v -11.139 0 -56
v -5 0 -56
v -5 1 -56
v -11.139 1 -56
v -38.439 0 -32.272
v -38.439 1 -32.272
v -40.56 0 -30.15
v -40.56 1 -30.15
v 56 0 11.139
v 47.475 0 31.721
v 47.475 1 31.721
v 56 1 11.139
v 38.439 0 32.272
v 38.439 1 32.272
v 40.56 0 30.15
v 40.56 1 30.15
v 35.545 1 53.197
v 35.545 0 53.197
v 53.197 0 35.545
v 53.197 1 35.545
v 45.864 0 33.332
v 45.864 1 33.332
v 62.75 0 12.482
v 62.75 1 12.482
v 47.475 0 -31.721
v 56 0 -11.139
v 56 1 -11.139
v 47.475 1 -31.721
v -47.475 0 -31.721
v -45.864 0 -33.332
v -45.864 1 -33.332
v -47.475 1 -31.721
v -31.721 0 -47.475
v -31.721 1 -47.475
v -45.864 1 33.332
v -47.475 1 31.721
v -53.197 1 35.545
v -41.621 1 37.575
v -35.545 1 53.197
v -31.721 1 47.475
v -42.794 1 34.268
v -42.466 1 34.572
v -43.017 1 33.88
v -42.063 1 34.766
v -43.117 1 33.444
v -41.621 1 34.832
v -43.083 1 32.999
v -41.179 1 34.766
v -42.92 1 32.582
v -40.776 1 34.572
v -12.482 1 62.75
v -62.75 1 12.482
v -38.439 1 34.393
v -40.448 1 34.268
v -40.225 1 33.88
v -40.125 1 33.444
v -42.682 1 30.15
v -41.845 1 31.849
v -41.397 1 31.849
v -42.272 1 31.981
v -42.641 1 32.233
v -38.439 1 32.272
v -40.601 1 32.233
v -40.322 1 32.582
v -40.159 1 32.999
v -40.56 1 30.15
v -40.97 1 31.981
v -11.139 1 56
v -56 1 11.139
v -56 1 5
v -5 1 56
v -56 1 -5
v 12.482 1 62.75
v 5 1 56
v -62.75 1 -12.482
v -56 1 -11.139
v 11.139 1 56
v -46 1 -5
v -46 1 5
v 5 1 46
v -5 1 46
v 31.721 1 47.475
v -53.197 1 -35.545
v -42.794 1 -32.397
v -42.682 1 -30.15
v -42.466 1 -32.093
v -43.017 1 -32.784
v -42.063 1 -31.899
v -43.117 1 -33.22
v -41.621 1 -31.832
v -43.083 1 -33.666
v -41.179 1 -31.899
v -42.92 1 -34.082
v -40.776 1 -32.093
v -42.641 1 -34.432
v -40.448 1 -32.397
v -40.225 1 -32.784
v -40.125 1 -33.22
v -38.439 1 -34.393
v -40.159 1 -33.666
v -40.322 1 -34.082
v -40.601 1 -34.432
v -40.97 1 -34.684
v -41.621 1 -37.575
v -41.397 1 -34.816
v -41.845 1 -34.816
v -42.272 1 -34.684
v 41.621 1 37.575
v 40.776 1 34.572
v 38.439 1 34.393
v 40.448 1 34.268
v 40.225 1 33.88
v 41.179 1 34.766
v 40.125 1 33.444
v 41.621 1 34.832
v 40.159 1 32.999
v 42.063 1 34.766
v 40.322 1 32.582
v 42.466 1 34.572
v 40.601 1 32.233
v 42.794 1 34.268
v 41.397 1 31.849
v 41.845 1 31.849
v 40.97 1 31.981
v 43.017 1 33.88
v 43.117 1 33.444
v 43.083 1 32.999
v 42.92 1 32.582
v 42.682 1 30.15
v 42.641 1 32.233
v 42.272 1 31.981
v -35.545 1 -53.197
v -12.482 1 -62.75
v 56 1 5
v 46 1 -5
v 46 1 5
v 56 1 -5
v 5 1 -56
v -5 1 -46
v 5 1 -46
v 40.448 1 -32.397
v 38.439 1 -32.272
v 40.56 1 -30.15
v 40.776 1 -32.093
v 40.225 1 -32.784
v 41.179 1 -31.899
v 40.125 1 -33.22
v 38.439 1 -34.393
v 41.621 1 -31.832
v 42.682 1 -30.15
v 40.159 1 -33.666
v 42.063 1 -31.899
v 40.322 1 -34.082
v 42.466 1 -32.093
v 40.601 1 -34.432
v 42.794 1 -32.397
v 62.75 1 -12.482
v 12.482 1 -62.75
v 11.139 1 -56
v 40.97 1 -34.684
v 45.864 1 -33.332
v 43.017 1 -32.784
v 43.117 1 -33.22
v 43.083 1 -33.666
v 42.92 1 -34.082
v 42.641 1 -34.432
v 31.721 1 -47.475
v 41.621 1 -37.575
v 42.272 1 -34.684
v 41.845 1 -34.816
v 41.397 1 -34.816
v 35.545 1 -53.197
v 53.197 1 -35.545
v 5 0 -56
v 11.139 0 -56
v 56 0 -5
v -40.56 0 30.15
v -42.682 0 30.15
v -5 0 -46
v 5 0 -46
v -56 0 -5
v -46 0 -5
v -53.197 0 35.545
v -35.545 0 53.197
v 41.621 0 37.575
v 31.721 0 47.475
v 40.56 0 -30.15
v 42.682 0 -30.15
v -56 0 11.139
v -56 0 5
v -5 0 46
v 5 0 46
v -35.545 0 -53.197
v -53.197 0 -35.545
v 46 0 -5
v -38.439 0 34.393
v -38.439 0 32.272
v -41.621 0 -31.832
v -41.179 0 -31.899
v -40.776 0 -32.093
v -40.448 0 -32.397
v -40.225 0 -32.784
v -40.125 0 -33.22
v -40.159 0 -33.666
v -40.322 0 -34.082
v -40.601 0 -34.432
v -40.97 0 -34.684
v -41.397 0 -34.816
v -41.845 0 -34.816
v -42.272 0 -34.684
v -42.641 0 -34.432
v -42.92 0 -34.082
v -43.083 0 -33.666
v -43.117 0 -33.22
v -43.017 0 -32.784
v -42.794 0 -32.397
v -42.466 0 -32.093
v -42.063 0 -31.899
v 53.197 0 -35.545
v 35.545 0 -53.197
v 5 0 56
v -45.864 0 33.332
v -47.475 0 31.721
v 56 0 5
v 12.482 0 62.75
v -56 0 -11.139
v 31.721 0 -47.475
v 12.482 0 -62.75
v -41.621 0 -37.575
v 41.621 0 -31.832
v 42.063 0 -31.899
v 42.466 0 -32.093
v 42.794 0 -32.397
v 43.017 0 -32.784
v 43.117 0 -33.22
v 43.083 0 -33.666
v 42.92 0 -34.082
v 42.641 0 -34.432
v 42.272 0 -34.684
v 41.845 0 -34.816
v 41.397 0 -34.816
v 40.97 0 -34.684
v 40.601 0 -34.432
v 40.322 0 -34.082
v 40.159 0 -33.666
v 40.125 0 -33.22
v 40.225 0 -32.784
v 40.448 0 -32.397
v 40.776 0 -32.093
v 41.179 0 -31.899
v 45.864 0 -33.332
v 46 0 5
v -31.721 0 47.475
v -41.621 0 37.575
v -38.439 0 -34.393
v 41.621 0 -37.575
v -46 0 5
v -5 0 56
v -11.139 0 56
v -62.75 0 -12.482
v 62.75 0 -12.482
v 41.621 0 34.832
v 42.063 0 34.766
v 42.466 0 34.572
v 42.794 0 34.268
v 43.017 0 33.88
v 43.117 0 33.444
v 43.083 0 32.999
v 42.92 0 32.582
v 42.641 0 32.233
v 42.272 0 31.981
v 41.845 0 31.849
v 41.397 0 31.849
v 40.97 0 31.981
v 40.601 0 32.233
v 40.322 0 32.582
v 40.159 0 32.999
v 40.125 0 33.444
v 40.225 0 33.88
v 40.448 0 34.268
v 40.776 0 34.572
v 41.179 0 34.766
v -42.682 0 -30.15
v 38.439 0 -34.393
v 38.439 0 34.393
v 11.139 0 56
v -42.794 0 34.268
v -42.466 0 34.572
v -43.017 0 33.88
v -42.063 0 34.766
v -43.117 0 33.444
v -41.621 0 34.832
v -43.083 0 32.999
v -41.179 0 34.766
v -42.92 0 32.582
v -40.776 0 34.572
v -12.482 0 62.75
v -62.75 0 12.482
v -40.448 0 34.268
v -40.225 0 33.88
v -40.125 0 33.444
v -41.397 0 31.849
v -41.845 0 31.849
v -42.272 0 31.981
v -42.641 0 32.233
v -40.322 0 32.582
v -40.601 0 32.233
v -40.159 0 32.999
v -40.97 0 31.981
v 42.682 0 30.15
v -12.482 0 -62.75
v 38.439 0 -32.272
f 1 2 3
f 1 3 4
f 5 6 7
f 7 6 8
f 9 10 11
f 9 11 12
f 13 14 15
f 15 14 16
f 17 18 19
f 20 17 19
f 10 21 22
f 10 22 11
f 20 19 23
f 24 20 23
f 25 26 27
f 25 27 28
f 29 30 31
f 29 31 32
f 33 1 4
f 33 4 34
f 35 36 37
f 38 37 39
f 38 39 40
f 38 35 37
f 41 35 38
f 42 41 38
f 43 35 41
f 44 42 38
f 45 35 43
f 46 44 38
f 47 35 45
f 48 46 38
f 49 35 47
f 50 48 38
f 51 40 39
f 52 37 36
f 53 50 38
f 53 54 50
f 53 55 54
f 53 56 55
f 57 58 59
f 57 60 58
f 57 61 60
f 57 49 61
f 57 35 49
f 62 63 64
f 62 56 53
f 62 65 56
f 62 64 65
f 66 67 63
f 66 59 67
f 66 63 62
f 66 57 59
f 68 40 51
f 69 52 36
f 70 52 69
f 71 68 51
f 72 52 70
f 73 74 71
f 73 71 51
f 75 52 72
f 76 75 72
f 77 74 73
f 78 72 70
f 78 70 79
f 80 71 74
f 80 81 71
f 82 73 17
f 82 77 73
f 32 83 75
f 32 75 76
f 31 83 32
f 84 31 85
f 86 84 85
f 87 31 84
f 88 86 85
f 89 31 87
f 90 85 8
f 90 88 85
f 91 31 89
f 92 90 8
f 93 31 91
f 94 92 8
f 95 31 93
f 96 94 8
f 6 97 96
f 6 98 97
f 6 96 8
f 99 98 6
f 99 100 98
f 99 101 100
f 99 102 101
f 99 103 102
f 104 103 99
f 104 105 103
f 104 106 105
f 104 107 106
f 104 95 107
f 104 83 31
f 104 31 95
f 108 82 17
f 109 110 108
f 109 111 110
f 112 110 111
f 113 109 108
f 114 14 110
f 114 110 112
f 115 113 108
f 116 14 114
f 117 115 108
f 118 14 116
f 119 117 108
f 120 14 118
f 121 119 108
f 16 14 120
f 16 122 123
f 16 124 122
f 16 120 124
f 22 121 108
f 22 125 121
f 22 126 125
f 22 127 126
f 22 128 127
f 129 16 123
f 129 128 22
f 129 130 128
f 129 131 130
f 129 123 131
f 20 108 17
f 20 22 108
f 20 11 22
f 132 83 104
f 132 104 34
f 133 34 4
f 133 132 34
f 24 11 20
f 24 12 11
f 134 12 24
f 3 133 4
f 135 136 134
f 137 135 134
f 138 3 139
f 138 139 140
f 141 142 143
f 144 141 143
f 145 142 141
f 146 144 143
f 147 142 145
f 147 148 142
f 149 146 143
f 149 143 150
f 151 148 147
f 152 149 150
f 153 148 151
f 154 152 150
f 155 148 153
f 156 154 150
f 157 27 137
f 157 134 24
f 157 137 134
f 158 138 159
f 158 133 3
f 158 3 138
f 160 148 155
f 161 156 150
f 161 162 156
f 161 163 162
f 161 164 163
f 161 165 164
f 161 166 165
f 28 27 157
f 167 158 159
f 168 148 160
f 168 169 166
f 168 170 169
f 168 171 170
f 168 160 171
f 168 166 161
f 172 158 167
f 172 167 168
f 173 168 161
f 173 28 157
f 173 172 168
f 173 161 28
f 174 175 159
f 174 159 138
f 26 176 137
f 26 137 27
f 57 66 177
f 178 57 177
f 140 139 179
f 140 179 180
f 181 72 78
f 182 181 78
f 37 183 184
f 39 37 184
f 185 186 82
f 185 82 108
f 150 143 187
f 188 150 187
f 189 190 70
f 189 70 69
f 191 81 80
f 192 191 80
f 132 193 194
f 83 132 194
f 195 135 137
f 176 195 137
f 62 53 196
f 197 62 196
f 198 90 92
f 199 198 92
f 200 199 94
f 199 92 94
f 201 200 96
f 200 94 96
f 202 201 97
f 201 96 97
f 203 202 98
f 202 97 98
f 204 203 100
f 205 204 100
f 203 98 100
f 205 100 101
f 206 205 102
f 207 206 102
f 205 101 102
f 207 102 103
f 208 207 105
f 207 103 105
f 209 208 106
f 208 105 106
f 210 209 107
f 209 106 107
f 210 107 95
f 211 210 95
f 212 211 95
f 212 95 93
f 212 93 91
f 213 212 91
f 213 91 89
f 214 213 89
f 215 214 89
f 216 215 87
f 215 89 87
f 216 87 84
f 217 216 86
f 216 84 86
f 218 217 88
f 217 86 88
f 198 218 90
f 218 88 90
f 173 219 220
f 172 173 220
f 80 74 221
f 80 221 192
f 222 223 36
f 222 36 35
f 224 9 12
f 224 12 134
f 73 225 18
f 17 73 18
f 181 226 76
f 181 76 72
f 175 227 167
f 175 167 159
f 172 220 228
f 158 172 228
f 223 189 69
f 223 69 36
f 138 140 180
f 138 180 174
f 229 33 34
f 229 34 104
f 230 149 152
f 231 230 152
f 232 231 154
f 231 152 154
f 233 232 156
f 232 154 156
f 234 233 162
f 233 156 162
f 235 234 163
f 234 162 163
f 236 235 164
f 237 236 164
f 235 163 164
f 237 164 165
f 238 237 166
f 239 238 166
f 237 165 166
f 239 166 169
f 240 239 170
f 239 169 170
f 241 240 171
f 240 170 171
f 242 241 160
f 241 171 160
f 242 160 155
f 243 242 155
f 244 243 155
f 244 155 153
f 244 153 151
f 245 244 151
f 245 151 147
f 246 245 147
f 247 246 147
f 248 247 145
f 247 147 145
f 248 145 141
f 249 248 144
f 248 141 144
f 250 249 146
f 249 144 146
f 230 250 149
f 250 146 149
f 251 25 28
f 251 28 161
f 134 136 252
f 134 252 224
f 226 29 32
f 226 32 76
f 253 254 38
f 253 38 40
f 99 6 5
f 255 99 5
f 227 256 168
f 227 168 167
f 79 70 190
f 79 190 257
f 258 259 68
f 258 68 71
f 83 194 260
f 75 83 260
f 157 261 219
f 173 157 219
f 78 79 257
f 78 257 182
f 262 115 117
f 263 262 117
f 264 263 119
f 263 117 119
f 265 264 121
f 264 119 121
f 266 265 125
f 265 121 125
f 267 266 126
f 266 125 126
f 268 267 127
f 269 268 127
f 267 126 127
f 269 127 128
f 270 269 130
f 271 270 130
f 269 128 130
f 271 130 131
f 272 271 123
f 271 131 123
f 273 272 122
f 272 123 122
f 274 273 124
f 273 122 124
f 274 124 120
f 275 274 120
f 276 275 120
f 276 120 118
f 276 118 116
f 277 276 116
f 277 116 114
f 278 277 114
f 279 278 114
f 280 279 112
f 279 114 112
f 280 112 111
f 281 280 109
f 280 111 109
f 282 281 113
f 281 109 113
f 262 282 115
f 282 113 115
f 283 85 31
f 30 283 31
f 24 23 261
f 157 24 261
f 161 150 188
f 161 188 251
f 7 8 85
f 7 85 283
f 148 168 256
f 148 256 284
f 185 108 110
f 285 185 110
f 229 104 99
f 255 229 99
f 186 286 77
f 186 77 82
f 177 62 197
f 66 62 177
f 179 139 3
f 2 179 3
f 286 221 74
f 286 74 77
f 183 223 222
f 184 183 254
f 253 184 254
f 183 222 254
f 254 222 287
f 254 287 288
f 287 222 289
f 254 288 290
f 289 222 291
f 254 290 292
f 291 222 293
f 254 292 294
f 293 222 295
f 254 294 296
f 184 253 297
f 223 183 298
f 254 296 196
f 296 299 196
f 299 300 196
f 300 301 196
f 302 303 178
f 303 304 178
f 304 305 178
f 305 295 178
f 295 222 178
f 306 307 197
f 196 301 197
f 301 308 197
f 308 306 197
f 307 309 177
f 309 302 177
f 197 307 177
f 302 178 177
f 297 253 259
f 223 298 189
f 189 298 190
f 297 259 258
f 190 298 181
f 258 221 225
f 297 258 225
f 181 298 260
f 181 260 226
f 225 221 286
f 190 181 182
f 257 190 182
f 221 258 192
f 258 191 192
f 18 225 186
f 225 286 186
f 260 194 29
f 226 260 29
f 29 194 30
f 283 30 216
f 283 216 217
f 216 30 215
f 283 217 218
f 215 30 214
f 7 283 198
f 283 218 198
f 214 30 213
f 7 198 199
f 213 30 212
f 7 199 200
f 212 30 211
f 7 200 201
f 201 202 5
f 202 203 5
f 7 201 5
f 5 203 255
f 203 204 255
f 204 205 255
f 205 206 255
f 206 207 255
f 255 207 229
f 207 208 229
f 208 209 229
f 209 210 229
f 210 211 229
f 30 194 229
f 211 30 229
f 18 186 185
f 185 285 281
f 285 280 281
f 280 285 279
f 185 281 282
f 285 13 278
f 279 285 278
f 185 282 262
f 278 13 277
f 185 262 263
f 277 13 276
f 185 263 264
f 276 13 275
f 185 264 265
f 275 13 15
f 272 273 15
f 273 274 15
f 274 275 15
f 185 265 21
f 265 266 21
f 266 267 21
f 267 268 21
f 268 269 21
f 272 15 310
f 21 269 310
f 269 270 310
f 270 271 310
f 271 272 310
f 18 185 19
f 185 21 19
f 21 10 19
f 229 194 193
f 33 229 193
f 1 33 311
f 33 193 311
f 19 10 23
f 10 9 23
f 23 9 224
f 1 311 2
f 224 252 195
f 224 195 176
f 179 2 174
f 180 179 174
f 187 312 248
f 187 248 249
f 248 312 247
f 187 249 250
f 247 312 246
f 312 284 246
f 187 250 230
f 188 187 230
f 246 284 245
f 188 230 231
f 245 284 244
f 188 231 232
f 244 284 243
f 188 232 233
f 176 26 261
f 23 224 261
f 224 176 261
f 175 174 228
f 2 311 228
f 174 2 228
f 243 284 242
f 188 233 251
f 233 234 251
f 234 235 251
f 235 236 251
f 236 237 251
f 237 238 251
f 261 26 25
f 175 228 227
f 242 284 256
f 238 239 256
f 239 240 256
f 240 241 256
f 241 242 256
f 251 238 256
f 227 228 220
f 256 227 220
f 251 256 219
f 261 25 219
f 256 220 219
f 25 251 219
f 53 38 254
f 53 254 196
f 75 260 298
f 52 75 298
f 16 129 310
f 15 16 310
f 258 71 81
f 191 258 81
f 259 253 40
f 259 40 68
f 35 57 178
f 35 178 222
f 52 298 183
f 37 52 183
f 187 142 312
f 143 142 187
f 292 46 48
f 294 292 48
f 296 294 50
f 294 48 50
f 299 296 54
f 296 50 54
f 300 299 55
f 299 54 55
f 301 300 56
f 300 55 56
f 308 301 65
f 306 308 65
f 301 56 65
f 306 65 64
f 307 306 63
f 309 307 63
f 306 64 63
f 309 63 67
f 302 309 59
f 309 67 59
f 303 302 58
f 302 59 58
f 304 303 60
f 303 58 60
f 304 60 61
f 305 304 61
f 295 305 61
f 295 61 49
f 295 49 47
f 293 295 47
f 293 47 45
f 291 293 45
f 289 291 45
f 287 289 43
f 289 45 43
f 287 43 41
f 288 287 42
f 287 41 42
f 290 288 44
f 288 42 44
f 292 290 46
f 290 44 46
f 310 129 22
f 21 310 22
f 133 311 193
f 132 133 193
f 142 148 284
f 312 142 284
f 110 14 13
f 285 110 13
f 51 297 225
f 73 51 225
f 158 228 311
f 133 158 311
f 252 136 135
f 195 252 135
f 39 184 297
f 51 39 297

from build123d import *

# Parameters (mm, degrees)
BOSS_EXTRUDE1_DEPTH = 1
SKETCH2_W           = 10
SKETCH2_H           = 10
BOSS_EXTRUDE2_DEPTH = 1
SKETCH3_R           = 1.5
BOSS_EXTRUDE3_DEPTH = 1
CHAMFER1_SIZE       = 1.5


with BuildPart() as part:
    # Sketch1 → Boss-Extrude1 (new body)
    with BuildSketch(Plane(origin=(0, 0, 0), x_dir=(1, 0, 0), z_dir=(0, 1, 0))):
        Polygon((62.75, -12.481751053), (62.75, 12.481751053), (53.19688133, 35.545019709), (35.545019709, 53.19688133), (12.481751053, 62.75), (-12.481751053, 62.75), (-35.545019709, 53.19688133), (-53.19688133, 35.545019709), (-62.75, 12.481751053), (-62.75, -12.481751053), (-53.19688133, -35.545019709), (-35.545019709, -53.19688133), (-12.481751053, -62.75), (12.481751053, -62.75), (35.545019709, -53.19688133), (53.19688133, -35.545019709), align=None)
        Polygon((56, -11.139092573), (56, 11.139092573), (47.474507641, 31.721451852), (31.721451852, 47.474507641), (11.139092573, 56), (-11.139092573, 56), (-31.721451852, 47.474507641), (-47.474507641, 31.721451852), (-56, 11.139092573), (-56, -11.139092573), (-47.474507641, -31.721451852), (-31.721451852, -47.474507641), (-11.139092573, -56), (11.139092573, -56), (31.721451852, -47.474507641), (47.474507641, -31.721451852), align=None, mode=Mode.SUBTRACT)
    extrude(amount=BOSS_EXTRUDE1_DEPTH)

    # Sketch2 → Boss-Extrude2 (add)
    with BuildSketch(Plane(origin=(0, 1, 0), x_dir=(1, 0, 0), z_dir=(0, 1, 0))):
        with Locations((0, 51)):
            Rectangle(SKETCH2_W, SKETCH2_H)
        with Locations((51, 0)):
            Rectangle(SKETCH2_W, SKETCH2_H)
        with Locations((0, -51)):
            Rectangle(SKETCH2_W, SKETCH2_H)
        with Locations((-51, 0)):
            Rectangle(SKETCH2_W, SKETCH2_H)
    extrude(amount=-BOSS_EXTRUDE2_DEPTH)

    # Sketch3 → Boss-Extrude3 (add)
    # profile 1 of 4: a face of its own
    with BuildSketch(Plane(origin=(0, 1, 0), x_dir=(1, 0, 0), z_dir=(0, 1, 0))):
        Polygon((-45.863587475, 33.332372018), (-41.620946788, 37.575012705), (-37.378306101, 33.332372018), (-41.620946788, 29.08973133), align=None)
        with Locations(Location((-41.620946788, 33.332372018, 0), (0, 0, 270))):
            Circle(SKETCH3_R, mode=Mode.SUBTRACT)
    # profile 2 of 4: a face of its own
    with BuildSketch(Plane(origin=(0, 1, 0), x_dir=(1, 0, 0), z_dir=(0, 1, 0))):
        Polygon((37.378306101, 33.332372018), (41.620946788, 29.08973133), (45.863587475, 33.332372018), (41.620946788, 37.575012705), align=None)
        with Locations(Location((41.620946788, 33.332372018, 0), (0, 0, 270))):
            Circle(SKETCH3_R, mode=Mode.SUBTRACT)
    # profile 3 of 4: a face of its own
    with BuildSketch(Plane(origin=(0, 1, 0), x_dir=(1, 0, 0), z_dir=(0, 1, 0))):
        Polygon((41.620946788, -37.575012705), (37.378306101, -33.332372018), (41.620946788, -29.08973133), (45.863587475, -33.332372018), align=None)
        with Locations(Location((41.620946788, -33.332372018, 0), (0, 0, 270))):
            Circle(SKETCH3_R, mode=Mode.SUBTRACT)
    # profile 4 of 4: a face of its own
    with BuildSketch(Plane(origin=(0, 1, 0), x_dir=(1, 0, 0), z_dir=(0, 1, 0))):
        Polygon((-37.378306101, -33.332372018), (-41.620946788, -29.08973133), (-45.863587475, -33.332372018), (-41.620946788, -37.575012705), align=None)
        with Locations(Location((-41.620946788, -33.332372018, 0), (0, 0, 270))):
            Circle(SKETCH3_R, mode=Mode.SUBTRACT)
    extrude(amount=-BOSS_EXTRUDE3_DEPTH)

    # Chamfer1
    chamfer1_edges = [part.edges().sort_by_distance(p)[0] for p in [
        (-37.378306101, 0.5, -33.332372018),
        (-41.620946788, 0.5, -29.08973133),
        (41.620946788, 0.5, -29.08973133),
        (37.378306101, 0.5, -33.332372018),
        (41.620946788, 0.5, 29.08973133),
        (37.378306101, 0.5, 33.332372018),
        (-41.620946788, 0.5, 29.08973133),
        (-37.378306101, 0.5, 33.332372018),
    ]]
    chamfer(chamfer1_edges, length=CHAMFER1_SIZE)


solid = part.part
